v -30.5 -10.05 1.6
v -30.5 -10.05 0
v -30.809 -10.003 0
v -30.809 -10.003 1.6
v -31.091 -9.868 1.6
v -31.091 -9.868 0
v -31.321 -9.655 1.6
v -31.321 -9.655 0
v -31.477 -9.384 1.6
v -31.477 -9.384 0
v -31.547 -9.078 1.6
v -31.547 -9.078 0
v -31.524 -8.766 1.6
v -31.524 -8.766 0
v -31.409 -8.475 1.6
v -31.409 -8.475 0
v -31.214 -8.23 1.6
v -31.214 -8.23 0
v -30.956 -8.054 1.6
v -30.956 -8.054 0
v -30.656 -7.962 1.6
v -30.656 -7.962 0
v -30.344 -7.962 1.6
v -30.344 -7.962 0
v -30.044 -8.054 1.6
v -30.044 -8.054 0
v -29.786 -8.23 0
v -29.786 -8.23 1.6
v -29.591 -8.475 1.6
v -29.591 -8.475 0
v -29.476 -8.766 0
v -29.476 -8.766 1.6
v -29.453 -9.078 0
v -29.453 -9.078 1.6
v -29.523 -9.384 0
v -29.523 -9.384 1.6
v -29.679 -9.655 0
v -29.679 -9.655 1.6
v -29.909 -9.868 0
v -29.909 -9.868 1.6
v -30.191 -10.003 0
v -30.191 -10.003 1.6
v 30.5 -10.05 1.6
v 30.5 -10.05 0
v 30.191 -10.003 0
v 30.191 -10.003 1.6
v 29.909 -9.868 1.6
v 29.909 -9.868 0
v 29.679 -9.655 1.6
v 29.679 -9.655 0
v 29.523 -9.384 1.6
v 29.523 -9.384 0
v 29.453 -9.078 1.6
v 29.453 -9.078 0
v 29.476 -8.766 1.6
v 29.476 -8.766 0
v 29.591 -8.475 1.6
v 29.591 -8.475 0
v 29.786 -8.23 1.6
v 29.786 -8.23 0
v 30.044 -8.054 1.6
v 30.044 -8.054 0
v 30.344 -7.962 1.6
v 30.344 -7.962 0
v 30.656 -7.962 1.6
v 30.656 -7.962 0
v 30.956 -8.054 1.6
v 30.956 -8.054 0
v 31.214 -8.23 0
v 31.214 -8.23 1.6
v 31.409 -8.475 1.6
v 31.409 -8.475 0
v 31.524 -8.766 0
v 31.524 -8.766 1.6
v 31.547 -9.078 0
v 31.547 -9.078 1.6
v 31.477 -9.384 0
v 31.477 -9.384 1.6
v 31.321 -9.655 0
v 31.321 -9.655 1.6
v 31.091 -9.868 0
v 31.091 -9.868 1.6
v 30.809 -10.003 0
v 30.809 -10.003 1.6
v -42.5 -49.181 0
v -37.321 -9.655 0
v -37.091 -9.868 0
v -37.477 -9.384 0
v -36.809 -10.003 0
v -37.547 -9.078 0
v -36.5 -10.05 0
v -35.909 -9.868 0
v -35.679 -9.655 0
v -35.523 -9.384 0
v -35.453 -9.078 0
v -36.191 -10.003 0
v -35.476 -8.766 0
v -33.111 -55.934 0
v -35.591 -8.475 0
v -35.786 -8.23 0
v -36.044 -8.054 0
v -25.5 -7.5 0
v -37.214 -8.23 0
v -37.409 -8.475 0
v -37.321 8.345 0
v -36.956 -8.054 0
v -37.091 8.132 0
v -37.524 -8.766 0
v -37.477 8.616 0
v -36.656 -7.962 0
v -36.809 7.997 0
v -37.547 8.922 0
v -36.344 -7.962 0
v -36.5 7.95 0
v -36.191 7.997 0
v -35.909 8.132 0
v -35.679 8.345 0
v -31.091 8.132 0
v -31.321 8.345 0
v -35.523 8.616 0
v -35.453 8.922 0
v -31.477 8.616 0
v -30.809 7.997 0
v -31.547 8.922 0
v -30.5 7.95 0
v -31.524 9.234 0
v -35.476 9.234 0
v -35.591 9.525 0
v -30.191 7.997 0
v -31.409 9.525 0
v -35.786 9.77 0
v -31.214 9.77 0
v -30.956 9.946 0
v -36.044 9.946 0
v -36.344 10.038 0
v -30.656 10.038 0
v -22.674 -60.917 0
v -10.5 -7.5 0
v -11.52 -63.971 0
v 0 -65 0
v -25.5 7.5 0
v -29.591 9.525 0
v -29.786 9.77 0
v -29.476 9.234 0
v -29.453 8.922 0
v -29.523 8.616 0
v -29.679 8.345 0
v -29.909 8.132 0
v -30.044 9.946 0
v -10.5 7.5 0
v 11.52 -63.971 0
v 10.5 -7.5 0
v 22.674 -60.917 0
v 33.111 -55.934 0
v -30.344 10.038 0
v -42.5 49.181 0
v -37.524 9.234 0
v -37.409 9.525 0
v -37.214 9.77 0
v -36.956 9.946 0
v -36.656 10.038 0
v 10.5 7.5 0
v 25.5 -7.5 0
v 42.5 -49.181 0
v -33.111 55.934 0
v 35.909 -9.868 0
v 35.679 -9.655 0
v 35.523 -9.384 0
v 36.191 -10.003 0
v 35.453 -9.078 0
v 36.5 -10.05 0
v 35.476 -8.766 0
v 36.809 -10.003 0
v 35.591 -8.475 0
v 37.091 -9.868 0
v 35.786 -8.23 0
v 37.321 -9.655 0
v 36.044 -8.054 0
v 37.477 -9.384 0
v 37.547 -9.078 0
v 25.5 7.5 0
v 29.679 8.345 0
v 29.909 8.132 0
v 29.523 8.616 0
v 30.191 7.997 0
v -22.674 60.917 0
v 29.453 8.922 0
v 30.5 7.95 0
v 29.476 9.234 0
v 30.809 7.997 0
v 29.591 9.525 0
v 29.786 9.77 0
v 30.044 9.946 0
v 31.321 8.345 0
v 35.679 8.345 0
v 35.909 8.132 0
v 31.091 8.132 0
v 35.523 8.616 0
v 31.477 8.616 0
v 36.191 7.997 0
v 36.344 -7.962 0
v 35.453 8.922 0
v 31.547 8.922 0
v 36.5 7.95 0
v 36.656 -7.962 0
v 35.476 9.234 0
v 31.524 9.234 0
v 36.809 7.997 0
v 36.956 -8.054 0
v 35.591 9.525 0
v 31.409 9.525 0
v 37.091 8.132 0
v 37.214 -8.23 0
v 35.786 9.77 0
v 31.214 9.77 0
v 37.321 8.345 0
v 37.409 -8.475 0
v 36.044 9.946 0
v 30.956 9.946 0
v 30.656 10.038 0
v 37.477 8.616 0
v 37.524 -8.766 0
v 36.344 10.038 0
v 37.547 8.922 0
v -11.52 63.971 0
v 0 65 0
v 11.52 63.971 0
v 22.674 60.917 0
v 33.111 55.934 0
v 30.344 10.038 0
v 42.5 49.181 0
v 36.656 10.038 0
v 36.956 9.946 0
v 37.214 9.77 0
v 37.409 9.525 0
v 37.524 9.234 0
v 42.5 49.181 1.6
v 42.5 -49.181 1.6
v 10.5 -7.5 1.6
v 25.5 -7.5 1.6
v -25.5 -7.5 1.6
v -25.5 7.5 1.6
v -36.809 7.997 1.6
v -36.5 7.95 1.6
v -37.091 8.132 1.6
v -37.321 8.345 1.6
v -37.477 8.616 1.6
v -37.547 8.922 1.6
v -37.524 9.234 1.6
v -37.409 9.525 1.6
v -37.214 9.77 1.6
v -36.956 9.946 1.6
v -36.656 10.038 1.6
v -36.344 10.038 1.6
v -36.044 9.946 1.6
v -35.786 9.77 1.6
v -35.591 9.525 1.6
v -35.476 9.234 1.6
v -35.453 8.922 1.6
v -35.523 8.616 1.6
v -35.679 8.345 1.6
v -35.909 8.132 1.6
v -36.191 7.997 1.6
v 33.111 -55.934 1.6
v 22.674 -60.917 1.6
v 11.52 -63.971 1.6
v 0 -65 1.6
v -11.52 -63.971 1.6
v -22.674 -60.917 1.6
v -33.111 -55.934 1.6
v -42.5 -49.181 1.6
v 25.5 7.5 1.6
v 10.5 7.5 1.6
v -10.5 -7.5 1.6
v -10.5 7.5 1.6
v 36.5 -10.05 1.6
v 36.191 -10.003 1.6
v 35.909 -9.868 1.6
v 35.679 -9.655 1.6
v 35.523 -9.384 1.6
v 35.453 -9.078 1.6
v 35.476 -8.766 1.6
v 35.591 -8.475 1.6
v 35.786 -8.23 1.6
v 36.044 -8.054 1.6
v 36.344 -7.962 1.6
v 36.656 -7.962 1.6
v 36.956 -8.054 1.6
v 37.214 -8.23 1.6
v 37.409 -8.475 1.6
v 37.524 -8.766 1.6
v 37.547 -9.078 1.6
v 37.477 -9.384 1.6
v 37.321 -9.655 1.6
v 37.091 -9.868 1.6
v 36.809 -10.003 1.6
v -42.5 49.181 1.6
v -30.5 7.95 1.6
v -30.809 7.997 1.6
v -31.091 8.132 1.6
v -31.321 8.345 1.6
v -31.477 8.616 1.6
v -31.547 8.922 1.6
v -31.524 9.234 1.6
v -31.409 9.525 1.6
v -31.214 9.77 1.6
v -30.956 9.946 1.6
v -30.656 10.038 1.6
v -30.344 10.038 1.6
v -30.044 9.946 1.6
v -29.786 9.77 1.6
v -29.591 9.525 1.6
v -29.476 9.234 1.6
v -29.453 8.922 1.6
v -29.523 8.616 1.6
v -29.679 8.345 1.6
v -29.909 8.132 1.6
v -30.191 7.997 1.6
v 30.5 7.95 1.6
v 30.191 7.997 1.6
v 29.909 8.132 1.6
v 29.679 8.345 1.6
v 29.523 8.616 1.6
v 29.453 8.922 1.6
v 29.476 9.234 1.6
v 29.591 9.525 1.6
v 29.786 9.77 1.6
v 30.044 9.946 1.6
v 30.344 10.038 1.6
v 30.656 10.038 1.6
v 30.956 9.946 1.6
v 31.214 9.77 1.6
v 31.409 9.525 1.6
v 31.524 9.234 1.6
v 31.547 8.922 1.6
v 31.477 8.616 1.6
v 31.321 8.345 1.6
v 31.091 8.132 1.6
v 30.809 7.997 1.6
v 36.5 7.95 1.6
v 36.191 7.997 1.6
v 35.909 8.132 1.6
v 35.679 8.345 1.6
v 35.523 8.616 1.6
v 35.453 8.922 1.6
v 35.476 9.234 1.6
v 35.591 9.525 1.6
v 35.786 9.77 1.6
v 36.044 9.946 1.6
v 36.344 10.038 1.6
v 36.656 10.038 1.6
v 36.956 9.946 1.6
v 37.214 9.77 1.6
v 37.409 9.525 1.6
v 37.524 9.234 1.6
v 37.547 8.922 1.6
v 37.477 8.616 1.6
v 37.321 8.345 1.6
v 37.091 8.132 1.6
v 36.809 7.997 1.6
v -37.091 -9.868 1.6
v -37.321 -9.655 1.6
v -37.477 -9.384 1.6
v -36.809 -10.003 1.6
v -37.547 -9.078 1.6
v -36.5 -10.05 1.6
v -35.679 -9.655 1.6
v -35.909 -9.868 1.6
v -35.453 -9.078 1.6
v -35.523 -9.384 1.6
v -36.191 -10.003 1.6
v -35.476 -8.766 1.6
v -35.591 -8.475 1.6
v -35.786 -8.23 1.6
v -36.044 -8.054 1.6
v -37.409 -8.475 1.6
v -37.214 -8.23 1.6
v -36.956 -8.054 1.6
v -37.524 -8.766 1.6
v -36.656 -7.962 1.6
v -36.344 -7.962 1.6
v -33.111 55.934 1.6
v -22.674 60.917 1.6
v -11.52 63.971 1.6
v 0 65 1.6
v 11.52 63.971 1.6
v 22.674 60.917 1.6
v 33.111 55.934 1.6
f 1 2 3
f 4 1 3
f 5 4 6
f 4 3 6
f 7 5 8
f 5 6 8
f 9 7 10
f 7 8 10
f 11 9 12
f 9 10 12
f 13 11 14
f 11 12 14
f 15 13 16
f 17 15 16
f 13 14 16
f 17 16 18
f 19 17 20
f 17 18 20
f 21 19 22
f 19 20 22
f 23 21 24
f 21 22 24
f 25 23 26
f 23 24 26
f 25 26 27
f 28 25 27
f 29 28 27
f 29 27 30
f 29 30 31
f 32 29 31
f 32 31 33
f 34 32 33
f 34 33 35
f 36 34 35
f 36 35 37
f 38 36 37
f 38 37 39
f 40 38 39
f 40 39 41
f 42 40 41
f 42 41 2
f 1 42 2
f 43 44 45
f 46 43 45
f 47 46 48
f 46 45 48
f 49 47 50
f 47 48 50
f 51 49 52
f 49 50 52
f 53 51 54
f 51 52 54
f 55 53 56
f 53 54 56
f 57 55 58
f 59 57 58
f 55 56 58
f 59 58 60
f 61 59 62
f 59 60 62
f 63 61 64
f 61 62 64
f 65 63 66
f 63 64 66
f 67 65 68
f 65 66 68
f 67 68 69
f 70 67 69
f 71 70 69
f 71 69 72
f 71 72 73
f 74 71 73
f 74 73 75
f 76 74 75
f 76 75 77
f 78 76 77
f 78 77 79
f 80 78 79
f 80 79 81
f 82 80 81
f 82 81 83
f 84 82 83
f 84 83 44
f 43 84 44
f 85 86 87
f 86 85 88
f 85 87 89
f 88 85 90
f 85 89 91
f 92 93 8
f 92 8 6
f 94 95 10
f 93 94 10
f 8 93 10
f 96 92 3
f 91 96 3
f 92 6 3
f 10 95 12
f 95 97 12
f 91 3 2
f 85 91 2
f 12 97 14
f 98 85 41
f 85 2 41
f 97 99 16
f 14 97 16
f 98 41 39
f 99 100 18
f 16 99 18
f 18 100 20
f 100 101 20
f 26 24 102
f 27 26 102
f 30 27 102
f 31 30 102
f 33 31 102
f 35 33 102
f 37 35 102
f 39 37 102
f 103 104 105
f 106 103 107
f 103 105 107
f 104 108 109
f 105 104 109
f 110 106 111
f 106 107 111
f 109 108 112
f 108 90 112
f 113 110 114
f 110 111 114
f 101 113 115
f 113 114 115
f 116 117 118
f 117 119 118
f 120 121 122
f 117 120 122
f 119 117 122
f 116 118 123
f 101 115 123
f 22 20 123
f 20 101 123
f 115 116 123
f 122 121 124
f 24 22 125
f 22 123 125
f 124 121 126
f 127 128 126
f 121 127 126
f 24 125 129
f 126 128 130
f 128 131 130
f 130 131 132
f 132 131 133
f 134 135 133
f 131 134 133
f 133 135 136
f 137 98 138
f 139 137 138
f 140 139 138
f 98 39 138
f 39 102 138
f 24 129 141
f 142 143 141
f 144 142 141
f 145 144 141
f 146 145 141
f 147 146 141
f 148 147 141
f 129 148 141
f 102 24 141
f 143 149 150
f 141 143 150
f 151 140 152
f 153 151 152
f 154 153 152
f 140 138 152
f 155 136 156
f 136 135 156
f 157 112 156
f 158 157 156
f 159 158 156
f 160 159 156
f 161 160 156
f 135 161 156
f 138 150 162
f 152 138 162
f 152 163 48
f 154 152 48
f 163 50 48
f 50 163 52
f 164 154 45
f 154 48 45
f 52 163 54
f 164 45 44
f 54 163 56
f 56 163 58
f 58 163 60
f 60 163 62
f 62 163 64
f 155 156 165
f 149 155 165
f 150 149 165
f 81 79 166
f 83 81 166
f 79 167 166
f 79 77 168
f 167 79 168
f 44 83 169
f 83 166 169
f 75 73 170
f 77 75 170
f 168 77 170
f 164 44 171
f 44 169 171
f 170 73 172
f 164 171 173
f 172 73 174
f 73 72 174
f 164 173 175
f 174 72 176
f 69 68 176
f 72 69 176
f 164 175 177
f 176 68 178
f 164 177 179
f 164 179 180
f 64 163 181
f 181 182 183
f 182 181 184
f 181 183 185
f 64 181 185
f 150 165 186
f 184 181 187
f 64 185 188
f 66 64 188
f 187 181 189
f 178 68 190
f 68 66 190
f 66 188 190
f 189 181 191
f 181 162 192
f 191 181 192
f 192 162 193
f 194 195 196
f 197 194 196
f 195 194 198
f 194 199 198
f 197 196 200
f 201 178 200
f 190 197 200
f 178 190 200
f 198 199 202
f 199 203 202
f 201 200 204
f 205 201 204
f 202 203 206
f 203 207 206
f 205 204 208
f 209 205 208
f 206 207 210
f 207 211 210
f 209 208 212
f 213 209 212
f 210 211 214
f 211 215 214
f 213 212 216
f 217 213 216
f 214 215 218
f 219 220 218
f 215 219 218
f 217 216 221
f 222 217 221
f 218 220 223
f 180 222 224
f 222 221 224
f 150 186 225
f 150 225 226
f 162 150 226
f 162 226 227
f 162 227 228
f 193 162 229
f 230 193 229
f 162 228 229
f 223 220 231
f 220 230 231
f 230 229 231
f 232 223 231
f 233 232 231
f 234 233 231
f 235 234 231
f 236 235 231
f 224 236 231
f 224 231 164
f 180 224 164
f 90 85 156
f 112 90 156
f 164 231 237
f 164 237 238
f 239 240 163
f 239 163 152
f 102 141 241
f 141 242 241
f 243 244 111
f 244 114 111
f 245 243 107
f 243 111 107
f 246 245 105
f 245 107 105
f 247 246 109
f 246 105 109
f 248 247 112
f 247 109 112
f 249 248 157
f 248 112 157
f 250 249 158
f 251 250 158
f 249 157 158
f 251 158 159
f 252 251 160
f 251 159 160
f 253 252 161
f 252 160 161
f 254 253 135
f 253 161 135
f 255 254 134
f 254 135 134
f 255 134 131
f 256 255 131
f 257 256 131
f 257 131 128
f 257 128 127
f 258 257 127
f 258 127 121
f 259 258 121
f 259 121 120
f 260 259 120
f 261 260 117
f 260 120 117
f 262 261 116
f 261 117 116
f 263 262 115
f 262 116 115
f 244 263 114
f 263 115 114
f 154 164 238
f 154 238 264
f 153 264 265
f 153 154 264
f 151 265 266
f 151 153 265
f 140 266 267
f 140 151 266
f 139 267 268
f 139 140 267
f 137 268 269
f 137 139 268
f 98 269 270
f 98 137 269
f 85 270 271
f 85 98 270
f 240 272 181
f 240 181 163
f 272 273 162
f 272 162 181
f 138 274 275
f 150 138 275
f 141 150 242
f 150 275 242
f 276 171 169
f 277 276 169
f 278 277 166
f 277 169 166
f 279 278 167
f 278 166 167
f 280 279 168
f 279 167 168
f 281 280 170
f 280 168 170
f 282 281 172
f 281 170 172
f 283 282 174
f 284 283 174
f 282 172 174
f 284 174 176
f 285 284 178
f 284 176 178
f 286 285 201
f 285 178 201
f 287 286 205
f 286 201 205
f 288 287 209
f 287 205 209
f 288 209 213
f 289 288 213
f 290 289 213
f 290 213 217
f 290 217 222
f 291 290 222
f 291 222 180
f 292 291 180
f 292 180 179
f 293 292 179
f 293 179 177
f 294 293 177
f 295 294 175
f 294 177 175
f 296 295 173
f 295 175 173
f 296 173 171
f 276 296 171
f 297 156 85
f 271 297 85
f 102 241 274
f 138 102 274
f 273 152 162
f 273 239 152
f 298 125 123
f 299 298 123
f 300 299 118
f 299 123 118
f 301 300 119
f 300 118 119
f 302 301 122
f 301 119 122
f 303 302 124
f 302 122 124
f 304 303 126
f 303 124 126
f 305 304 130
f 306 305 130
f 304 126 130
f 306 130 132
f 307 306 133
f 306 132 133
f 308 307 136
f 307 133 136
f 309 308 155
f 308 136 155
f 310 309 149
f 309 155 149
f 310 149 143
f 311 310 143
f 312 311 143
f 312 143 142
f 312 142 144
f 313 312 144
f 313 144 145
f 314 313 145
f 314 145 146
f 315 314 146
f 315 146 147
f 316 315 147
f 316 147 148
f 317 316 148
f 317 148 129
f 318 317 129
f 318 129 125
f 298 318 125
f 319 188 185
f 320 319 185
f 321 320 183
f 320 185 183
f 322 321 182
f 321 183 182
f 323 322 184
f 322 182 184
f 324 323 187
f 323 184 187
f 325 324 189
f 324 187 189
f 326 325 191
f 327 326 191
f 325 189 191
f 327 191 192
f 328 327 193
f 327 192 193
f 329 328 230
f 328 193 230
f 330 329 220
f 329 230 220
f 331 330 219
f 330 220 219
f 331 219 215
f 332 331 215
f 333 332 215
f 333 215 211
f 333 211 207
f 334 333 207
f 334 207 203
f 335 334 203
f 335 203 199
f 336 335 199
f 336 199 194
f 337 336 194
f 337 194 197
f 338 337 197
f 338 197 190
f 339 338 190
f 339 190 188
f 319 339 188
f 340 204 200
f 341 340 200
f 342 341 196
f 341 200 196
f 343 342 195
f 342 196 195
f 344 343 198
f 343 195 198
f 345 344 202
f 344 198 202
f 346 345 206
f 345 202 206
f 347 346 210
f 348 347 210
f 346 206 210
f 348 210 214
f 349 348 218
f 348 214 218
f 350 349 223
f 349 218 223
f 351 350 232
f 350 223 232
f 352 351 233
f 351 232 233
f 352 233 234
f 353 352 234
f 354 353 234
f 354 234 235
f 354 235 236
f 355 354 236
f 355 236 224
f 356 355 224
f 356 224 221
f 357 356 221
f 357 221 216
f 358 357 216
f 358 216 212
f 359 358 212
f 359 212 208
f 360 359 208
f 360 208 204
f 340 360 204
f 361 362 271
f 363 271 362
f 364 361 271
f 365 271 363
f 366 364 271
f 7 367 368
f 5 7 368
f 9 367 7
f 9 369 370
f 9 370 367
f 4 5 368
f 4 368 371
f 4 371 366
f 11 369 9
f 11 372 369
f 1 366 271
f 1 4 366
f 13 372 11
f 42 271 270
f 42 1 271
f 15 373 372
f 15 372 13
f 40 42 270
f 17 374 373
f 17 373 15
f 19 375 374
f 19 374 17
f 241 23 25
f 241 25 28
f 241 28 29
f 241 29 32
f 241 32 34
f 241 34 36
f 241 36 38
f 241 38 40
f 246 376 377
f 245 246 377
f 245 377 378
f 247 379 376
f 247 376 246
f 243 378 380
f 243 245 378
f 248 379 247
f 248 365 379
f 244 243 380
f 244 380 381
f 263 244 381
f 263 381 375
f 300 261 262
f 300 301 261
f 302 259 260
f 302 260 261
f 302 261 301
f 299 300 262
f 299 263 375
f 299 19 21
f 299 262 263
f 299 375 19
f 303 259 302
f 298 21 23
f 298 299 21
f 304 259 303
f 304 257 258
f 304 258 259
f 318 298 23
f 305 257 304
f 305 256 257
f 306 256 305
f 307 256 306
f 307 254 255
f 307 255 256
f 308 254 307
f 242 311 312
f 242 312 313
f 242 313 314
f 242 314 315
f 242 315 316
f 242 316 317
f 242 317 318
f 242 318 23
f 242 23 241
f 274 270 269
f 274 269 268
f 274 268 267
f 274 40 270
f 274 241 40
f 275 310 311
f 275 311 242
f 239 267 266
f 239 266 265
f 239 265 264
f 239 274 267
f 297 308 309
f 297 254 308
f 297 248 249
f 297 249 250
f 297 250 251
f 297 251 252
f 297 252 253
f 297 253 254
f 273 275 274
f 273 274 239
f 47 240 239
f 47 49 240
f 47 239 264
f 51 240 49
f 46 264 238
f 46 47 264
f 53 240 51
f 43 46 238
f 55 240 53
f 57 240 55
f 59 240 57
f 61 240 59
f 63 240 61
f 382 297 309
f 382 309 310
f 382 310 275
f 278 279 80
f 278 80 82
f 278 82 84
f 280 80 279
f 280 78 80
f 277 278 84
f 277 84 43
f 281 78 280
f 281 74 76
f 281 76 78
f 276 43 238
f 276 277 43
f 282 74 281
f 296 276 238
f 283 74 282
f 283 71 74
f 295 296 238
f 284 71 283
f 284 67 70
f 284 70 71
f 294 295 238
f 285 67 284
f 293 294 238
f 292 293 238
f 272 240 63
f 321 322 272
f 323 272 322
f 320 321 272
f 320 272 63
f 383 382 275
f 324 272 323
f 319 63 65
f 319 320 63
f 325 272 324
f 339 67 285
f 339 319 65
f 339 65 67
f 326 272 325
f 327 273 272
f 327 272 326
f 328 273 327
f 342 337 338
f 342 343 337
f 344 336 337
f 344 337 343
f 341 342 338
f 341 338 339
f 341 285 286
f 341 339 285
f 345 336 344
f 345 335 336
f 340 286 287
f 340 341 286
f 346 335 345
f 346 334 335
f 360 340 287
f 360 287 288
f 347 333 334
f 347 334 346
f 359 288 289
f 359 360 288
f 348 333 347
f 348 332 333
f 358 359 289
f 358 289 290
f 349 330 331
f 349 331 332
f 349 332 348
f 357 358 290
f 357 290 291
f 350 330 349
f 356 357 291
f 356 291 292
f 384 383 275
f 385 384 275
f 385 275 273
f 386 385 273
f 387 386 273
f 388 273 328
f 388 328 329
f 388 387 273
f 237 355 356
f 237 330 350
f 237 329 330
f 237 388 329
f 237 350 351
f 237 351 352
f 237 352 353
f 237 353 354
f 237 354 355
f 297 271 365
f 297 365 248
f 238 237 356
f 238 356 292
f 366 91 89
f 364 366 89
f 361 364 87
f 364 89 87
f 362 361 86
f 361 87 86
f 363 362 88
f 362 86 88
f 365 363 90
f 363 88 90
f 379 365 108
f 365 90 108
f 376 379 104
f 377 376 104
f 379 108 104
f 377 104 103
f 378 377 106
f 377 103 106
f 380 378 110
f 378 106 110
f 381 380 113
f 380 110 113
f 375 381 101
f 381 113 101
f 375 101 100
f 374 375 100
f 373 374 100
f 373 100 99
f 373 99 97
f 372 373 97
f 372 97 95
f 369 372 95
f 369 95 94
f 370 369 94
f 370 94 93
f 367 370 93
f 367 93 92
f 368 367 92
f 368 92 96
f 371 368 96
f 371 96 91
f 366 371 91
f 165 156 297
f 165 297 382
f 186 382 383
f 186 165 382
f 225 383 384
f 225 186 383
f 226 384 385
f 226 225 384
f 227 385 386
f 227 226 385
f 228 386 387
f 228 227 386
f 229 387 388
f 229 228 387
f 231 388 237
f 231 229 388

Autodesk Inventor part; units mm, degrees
ref_plane "YZ Plane" through (0, 0, 0) normal (1, 0, 0) x (0, 1, 0)
ref_plane "XZ Plane" through (0, 0, 0) normal (0, 1, 0) x (-1, 0, 0)
ref_plane "XY Plane" through (0, 0, 0) normal (0, 0, 1) x (1, 0, 0)
sketch "スケッチ1" plane through (0, 0, 0) normal (0, 0, 1) x (1, 0, 0)
  circle A0 centre (0, 0) radius 65 construction
  line L0 (-42.5, 65) -> (42.5, 65) construction
  line L1 (42.5, 65) -> (42.5, -65) construction
  line L2 (42.5, -65) -> (-42.5, -65) construction
  line L3 (-42.5, -65) -> (-42.5, 65) construction
  arc A1 (42.5, 49.1808) -> (-42.5, 49.1808) centre (0, 0) ccw
  arc A2 (-42.5, -49.1808) -> (42.5, -49.1808) centre (0, 0) ccw
  line L4 (0, 76.204) -> (0, -76.204) construction
  line L5 (-73.9944, 0) -> (73.9944, 0) construction
  line L6 (-42.5, 49.1808) -> (-42.5, -49.1808)
  line L7 (42.5, 49.1808) -> (42.5, -49.1808)
  point P0 (0, -65)
  point P1 (-42.5, 0)
  dimension "d0" = 130
  dimension "d1" = 85
extrude "基板" add sketch "スケッチ1" along normal blind 1.6
sketch "スケッチ2" plane through (0, 0, 1.6) normal (0, 0, 1) x (1, 0, 0)
  line L0 (-58.3969, 0) -> (58.3969, 0) construction
  line L1 (0, 57.0916) -> (0, -57.0916) construction
  line L2 (-42.5, 49.1808) -> (-42.5, -49.1808) construction
  point P0 (0, 0)
  point P1 (0, 0)
  point P2 (-36.5, 9)
  point P3 (-36.5, -9)
  point P4 (-30.5, 9)
  point P5 (-30.5, -9)
  point P6 (36.5, 9)
  point P7 (36.5, -9)
  point P8 (30.5, -9)
  point P9 (30.5, 9)
  dimension "d8" = 18
  dimension "d9" = 6
  dimension "d18" = 6
hole "ギヤボックス取付穴" at (-36.5, 9, 1.6) at (-36.5, -9, 1.6) at (-30.5, 9, 1.6) at (-30.5, -9, 1.6) at (36.5, 9, 1.6) at (36.5, -9, 1.6) at (30.5, -9, 1.6) at (30.5, 9, 1.6) direction (0, 0, -1) diameter 2.1 end through all
sketch "スケッチ3" plane through (0, 0, 1.6) normal (0, 0, 1) x (1, 0, 0)
  line L0 (-55.3039, 0) -> (55.3039, 0) construction
  line L1 (-10.5, 7.5) -> (-25.5, 7.5)
  line L2 (-25.5, 7.5) -> (-25.5, -7.5)
  line L3 (-25.5, -7.5) -> (-10.5, -7.5)
  line L4 (-10.5, -7.5) -> (-10.5, 7.5)
  line L5 (10.5, 7.5) -> (25.5, 7.5)
  line L6 (25.5, 7.5) -> (25.5, -7.5)
  line L7 (25.5, -7.5) -> (10.5, -7.5)
  line L8 (10.5, -7.5) -> (10.5, 7.5)
  line L9 (0, 63.8945) -> (0, -63.8945) construction
  circle A0 centre (-30.5, 9) radius 1.05 projected
  point P0 (0, 0)
  point P1 (0, 0)
  point P2 (-10.5, 0)
  dimension "d19" = 20
  dimension "d20" = 15
  dimension "d21" = 15
extrude "エンコーダ取出し穴" cut sketch "スケッチ3" against normal blind 1.6 contours L4 L3 L2 L1 | L5 L6 L7 L8
properties part number "BaseBoard1"
